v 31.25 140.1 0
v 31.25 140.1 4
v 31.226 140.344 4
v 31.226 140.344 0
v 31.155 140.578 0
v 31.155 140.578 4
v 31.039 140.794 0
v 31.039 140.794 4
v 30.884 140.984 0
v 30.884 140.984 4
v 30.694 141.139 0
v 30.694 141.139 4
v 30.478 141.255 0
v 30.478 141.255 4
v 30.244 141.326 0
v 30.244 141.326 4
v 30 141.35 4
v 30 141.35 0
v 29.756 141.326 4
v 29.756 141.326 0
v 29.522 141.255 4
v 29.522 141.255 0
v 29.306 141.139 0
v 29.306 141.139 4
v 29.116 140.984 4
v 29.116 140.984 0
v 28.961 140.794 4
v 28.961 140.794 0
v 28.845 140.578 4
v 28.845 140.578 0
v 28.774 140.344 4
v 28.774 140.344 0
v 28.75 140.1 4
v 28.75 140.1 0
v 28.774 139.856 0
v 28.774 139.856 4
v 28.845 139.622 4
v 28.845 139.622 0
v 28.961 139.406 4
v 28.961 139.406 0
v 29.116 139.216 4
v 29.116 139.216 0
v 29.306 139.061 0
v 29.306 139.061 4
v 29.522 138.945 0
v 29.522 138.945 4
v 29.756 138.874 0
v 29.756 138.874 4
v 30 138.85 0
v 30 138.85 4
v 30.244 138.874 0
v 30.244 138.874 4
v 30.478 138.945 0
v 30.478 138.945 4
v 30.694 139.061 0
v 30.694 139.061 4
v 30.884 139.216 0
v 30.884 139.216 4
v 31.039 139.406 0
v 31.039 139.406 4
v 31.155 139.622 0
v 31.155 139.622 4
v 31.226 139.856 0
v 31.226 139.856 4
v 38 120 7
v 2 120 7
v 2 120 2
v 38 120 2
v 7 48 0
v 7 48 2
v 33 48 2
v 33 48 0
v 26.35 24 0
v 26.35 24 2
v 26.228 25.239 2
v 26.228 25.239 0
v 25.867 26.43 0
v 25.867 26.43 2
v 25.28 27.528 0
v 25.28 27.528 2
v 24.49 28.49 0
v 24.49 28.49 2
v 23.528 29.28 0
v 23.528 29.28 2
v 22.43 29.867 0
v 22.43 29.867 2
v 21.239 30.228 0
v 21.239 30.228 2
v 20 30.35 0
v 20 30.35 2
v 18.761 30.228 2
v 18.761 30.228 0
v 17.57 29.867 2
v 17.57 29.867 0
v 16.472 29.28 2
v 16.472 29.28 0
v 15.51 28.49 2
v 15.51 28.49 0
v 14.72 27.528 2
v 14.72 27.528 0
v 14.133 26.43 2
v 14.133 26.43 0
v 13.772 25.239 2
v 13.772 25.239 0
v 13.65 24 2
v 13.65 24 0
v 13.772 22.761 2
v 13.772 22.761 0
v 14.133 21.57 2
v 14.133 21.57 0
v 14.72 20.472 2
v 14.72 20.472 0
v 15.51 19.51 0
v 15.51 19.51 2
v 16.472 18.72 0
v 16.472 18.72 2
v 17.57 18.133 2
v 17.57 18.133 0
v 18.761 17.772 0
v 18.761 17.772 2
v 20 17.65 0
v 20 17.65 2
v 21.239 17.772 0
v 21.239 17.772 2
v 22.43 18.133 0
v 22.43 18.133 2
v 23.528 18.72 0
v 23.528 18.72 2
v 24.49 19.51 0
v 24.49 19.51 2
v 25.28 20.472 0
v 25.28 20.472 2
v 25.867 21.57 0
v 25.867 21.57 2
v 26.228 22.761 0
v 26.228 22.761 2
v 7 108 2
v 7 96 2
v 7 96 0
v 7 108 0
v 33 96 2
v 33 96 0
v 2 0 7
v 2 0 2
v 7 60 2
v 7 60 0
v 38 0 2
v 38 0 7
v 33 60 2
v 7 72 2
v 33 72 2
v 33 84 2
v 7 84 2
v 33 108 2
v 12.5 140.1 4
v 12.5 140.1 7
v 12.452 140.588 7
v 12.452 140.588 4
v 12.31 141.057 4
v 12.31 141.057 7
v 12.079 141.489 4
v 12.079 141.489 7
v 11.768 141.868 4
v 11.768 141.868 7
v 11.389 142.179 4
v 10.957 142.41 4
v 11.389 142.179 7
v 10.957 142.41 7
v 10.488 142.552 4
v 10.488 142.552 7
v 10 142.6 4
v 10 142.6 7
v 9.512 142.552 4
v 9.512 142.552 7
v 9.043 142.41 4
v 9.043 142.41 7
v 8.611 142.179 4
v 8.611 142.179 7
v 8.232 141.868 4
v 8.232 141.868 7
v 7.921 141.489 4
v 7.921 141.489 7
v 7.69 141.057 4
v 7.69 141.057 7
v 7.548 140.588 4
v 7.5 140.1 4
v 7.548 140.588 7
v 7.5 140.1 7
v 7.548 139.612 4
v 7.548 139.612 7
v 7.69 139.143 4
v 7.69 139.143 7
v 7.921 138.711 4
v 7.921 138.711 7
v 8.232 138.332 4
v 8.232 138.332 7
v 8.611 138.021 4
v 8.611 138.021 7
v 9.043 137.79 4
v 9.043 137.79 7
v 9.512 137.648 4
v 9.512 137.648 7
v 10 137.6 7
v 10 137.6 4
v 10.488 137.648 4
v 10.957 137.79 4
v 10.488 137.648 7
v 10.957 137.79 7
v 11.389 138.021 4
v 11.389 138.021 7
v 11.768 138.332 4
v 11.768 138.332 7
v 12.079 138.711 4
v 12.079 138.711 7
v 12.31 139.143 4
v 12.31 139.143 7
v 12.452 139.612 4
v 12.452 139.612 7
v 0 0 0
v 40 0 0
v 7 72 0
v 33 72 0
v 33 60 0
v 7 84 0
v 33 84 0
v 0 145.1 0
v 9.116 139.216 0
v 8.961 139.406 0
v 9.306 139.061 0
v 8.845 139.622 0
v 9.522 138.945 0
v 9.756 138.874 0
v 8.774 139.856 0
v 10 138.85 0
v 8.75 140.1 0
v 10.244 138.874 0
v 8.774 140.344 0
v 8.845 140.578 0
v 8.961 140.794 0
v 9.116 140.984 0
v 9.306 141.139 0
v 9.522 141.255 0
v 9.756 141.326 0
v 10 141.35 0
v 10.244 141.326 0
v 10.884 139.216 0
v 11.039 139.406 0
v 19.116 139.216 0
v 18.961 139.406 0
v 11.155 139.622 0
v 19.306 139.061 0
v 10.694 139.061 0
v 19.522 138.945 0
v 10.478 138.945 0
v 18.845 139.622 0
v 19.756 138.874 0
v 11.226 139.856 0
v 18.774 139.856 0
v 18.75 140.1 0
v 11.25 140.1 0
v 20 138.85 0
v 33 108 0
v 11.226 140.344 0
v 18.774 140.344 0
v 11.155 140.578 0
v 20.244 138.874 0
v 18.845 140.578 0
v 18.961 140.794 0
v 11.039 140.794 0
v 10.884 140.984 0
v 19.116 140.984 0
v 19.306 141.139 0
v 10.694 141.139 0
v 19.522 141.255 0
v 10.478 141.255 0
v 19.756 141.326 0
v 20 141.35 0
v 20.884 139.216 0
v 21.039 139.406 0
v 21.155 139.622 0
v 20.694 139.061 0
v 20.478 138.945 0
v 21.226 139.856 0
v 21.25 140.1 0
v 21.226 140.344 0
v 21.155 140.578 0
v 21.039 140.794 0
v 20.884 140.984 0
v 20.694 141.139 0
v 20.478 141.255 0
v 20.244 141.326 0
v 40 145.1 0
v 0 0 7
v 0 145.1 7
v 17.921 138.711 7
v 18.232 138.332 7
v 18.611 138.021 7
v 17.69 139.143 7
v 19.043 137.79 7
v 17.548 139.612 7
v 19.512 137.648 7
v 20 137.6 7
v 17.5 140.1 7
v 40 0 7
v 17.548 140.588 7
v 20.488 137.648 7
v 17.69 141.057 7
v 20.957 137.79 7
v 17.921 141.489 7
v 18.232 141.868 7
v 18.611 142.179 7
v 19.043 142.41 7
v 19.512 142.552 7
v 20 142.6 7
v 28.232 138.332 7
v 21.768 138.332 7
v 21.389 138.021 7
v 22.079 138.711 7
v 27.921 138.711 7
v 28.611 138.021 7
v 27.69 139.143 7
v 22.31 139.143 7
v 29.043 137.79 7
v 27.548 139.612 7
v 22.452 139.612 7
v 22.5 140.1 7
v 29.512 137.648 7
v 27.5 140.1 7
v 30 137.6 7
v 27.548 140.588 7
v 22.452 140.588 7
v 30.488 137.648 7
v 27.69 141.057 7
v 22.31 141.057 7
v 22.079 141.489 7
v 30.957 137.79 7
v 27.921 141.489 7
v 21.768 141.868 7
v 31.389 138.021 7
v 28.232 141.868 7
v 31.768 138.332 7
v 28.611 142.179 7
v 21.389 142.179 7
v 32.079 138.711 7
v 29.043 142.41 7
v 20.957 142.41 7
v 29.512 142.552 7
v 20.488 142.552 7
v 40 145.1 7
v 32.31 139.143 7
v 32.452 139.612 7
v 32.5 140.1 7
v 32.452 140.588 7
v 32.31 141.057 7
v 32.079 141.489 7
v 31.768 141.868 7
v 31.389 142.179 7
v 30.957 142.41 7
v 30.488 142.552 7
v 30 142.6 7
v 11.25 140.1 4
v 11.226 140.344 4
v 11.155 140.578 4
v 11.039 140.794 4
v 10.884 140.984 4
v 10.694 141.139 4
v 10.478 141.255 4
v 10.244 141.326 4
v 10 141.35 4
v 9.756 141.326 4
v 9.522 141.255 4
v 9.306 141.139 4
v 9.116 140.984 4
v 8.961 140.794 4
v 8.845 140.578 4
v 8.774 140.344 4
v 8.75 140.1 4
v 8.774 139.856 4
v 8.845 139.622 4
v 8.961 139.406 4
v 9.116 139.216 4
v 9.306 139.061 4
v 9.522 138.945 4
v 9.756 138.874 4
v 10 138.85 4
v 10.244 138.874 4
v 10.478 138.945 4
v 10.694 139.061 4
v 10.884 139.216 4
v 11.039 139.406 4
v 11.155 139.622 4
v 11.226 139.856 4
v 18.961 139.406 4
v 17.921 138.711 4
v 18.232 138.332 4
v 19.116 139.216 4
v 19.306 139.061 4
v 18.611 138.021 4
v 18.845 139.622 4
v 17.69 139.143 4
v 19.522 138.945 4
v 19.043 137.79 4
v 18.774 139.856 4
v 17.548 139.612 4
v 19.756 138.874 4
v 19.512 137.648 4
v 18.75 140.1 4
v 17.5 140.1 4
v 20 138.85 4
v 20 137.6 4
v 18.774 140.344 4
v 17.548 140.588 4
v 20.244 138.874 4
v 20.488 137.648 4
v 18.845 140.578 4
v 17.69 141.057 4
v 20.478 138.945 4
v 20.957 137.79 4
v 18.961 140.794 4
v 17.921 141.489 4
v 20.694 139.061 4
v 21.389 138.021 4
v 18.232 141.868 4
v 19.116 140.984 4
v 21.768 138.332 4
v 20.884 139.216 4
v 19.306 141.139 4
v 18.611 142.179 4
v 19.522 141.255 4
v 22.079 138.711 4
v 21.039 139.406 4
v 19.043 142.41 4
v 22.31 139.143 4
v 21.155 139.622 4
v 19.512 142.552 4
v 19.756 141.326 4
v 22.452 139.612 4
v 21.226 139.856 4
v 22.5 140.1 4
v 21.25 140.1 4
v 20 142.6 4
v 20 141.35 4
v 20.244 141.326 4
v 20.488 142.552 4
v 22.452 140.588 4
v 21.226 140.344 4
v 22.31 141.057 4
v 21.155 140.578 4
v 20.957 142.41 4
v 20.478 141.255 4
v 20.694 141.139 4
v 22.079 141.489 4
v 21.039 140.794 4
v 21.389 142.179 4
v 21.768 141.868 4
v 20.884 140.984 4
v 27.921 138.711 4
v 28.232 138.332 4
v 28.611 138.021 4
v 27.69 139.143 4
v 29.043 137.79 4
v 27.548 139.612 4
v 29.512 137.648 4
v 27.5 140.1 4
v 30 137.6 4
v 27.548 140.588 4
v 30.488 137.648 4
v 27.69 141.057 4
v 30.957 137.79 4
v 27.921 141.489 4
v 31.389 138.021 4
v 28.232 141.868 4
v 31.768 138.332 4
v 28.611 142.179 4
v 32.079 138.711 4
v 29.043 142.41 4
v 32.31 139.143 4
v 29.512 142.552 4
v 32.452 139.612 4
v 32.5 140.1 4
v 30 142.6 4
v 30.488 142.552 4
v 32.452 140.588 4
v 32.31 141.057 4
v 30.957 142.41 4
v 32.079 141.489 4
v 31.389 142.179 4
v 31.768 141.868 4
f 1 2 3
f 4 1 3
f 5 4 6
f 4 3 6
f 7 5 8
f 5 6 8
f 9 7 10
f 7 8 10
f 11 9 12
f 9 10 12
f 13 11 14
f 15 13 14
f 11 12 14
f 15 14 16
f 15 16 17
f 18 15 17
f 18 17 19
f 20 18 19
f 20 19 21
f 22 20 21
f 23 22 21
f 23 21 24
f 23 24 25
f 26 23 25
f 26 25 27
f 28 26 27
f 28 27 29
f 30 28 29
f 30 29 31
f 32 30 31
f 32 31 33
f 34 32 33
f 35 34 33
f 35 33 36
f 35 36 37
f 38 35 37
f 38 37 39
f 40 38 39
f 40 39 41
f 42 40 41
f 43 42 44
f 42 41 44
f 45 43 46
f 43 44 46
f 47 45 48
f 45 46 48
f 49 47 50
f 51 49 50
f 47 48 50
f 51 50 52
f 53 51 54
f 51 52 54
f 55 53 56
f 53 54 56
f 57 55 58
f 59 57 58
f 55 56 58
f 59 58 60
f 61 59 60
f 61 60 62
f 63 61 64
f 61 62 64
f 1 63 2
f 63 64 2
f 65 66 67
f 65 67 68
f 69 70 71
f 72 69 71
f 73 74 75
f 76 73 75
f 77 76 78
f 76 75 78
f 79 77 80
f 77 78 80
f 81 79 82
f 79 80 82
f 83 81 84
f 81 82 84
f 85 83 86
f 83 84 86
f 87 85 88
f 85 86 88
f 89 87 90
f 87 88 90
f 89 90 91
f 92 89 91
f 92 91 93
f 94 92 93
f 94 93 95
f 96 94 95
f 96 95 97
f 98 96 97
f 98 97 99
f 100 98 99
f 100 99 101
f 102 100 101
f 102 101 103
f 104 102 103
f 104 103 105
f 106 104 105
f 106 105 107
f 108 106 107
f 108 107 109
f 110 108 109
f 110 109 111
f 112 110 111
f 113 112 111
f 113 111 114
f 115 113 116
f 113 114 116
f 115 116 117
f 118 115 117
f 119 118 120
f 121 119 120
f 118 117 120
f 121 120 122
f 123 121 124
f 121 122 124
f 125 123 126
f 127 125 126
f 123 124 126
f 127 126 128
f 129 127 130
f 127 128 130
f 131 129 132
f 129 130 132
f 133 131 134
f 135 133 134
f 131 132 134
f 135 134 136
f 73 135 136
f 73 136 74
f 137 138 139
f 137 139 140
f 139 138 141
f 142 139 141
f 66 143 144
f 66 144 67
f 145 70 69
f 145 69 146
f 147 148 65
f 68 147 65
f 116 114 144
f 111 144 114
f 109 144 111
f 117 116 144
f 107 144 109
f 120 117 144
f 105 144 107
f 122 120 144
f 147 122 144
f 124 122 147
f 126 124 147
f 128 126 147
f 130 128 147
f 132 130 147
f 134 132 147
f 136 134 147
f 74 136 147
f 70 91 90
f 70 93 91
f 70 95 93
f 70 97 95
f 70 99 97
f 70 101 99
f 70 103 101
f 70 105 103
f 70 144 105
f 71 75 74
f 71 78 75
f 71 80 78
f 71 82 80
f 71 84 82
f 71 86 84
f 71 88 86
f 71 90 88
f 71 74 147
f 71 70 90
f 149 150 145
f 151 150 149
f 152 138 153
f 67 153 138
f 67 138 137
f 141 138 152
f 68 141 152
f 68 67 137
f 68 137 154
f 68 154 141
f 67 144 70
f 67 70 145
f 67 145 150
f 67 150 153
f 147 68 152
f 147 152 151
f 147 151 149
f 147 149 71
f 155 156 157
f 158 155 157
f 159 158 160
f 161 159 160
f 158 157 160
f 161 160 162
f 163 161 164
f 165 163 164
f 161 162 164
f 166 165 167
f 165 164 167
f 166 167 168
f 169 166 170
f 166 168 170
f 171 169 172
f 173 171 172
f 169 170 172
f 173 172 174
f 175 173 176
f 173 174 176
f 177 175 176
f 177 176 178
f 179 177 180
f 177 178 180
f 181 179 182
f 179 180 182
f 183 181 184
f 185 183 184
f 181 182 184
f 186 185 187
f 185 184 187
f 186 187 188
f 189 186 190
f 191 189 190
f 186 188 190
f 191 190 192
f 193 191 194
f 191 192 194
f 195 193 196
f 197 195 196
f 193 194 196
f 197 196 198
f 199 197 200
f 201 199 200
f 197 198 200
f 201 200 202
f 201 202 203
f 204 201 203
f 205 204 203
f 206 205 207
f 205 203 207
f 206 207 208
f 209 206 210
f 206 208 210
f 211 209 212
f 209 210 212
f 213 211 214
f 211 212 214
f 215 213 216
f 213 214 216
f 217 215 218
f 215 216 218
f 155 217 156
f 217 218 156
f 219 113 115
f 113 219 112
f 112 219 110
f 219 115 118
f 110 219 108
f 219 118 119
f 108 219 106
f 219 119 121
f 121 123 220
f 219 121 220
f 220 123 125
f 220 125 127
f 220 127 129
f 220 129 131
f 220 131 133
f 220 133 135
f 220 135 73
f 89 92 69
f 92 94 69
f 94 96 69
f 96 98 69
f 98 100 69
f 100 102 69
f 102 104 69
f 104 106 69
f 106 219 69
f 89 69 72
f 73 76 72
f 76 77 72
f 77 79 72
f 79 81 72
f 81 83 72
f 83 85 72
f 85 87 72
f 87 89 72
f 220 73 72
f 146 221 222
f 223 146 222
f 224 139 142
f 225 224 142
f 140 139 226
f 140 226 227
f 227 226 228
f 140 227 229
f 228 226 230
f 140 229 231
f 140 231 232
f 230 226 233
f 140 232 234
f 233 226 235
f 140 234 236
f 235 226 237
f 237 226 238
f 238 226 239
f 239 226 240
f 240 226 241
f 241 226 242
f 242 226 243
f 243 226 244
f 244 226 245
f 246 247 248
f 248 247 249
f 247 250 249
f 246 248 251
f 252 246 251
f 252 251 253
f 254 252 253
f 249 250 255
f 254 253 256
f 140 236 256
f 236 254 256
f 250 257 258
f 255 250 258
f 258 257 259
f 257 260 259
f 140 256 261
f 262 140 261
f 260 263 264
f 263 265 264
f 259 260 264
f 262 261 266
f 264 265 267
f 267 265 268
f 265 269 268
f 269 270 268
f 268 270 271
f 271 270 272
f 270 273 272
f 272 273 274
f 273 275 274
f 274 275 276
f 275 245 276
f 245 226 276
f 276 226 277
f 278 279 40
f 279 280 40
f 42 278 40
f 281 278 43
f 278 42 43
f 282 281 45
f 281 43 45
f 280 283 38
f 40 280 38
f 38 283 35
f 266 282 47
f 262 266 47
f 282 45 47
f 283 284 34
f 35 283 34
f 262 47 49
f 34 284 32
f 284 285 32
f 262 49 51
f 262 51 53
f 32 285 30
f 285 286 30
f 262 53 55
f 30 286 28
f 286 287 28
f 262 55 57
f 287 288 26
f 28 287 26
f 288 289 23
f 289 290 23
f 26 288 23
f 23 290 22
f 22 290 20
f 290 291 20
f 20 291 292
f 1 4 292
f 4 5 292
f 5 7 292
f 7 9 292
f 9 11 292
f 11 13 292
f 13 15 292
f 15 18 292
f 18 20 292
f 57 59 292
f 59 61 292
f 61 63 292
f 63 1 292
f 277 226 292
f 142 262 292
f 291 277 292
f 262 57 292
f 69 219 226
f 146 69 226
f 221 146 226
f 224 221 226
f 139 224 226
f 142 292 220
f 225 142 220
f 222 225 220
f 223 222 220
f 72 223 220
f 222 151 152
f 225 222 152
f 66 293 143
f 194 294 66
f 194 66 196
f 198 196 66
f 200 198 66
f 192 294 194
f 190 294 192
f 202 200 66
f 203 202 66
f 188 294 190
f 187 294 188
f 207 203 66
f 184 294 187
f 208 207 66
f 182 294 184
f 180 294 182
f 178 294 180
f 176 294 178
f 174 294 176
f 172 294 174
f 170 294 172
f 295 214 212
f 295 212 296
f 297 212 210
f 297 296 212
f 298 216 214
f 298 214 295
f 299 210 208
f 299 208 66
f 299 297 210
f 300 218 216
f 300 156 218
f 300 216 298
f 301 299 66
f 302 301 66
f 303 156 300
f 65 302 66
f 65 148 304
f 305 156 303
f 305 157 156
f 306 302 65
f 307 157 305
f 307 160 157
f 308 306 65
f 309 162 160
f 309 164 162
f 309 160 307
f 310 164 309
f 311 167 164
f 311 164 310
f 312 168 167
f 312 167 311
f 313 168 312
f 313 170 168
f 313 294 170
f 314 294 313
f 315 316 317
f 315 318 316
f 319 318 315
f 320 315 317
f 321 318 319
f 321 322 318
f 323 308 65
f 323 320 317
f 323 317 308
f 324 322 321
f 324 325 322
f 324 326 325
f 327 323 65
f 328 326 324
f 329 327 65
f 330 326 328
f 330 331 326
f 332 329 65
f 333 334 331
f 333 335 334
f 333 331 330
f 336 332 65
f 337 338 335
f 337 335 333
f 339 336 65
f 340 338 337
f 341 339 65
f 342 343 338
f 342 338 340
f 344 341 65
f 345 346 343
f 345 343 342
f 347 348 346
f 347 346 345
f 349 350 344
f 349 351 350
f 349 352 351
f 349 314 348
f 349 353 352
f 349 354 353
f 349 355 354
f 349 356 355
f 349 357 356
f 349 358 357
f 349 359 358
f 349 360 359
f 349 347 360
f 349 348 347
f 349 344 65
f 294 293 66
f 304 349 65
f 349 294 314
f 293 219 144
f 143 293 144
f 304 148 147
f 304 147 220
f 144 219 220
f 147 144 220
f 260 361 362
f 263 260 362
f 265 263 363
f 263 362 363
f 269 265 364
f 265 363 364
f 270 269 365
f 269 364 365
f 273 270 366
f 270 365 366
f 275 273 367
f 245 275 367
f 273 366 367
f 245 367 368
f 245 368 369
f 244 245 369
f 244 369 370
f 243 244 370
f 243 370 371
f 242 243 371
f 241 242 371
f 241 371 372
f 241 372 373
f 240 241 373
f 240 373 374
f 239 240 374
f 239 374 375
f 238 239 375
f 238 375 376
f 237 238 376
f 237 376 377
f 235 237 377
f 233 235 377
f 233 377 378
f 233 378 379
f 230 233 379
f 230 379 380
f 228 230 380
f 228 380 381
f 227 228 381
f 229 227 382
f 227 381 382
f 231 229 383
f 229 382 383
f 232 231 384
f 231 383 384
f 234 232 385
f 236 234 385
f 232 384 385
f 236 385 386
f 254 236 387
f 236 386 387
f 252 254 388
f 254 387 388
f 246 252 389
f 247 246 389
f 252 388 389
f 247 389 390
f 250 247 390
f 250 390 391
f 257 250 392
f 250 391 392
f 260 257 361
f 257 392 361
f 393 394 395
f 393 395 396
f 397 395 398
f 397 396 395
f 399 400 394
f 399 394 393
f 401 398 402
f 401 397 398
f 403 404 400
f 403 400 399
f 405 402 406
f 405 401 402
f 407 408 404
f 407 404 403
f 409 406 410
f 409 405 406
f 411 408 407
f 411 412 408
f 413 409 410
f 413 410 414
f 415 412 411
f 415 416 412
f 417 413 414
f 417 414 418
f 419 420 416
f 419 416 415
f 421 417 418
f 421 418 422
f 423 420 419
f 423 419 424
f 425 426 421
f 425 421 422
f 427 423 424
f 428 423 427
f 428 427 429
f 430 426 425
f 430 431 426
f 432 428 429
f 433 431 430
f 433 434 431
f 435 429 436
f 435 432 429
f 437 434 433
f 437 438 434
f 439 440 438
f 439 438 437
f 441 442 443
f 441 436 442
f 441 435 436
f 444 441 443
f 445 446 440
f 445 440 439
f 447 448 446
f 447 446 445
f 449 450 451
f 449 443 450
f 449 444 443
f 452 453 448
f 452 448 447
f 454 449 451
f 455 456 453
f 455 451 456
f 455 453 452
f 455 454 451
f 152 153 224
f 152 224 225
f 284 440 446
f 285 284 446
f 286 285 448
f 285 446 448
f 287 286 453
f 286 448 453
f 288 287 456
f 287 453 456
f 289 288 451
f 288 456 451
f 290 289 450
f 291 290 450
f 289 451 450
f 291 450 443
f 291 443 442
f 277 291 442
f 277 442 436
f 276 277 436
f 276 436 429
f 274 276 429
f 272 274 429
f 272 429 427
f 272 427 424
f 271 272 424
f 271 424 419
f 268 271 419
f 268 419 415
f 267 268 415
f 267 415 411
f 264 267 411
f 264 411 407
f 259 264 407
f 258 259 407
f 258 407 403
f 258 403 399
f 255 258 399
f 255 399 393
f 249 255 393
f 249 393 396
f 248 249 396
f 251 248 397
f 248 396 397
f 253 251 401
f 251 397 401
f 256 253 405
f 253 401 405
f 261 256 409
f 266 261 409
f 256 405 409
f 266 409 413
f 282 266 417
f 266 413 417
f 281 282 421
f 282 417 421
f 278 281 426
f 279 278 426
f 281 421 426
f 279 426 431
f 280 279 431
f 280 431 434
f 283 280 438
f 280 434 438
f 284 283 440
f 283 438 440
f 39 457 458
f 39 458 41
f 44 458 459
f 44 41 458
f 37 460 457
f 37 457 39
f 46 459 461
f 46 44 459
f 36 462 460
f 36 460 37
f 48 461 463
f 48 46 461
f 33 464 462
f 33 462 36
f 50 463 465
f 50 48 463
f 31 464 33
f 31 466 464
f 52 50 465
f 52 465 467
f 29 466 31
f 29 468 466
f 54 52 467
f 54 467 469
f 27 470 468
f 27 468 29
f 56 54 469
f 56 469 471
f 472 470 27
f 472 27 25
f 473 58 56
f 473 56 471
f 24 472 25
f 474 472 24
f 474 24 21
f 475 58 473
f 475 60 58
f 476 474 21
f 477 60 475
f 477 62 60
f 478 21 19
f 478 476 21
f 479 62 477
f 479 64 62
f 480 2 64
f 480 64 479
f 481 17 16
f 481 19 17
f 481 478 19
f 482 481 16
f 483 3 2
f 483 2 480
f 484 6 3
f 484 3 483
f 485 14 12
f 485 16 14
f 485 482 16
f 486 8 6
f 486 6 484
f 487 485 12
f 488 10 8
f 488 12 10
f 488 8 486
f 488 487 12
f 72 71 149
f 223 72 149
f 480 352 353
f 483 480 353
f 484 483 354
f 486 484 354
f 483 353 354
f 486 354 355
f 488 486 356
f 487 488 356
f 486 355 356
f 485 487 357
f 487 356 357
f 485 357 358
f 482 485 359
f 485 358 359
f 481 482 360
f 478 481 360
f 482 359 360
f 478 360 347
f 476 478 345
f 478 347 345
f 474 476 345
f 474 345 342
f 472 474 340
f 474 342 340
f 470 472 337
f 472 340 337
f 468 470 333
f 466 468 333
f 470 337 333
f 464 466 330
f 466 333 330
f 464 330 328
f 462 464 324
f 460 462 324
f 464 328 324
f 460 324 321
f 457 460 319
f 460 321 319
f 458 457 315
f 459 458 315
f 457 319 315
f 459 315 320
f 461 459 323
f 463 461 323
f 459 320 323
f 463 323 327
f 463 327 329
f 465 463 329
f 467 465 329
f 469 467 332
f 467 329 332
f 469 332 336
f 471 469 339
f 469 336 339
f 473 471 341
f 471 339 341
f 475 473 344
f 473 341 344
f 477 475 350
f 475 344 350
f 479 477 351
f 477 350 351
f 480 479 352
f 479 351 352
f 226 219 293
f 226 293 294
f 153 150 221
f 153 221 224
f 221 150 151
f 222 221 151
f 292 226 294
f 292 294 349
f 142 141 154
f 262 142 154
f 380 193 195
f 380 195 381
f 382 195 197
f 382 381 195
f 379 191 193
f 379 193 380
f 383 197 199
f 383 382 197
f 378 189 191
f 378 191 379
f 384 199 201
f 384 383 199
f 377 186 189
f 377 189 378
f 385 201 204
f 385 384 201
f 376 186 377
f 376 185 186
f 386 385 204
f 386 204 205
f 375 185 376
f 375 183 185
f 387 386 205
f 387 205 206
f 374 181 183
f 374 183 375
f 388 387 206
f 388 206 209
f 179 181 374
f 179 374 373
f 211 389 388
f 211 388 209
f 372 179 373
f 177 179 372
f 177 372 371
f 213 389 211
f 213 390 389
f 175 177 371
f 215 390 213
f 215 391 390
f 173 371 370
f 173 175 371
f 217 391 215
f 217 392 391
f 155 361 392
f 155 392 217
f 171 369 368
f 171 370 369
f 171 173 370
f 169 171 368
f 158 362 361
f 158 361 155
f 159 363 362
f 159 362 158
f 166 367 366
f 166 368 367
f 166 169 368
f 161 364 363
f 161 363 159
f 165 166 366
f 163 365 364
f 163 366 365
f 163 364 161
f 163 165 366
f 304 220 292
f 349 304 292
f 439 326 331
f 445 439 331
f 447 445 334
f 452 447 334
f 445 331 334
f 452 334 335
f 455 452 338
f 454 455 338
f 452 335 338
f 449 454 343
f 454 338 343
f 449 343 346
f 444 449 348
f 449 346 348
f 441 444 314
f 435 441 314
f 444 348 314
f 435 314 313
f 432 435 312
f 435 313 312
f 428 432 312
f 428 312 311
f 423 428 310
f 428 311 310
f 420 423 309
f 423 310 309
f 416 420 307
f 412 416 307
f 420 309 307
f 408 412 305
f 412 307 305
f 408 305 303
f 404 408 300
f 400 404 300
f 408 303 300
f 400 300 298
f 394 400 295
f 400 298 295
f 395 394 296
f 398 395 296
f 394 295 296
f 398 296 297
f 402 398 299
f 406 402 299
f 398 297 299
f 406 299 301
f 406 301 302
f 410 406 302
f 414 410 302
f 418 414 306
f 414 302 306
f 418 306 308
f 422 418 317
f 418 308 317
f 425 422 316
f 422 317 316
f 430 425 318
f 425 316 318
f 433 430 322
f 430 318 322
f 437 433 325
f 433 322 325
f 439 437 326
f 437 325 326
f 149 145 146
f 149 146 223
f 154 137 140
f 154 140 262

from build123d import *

# Parameters (mm, degrees)
SKETCH1_W           = 40
SKETCH1_H           = 145.1
BOSS_EXTRUDE1_DEPTH = 7
SKETCH2_R           = 1.25
CUT_EXTRUDE1_DEPTH  = 7
SKETCH3_R           = 2.5
CUT_EXTRUDE2_DEPTH  = 3
SKETCH4_R           = 6.35
CUT_EXTRUDE3_DEPTH  = 8
SKETCH5_W           = 36
SKETCH5_H           = 120
CUT_EXTRUDE4_DEPTH  = 5
SKETCH6_W           = 26
SKETCH6_H           = 12
CUT_EXTRUDE5_DEPTH  = 3


with BuildPart() as part:
    # Sketch1 → Boss-Extrude1 (new body)
    with BuildSketch(Plane.XY):
        with Locations((20, 72.55)):
            Rectangle(SKETCH1_W, SKETCH1_H)
    extrude(amount=BOSS_EXTRUDE1_DEPTH)

    # Sketch2 → Cut-Extrude1 (cut)
    with BuildSketch(Plane.XY.offset(7)):
        with Locations((20, 140.1)):
            Circle(SKETCH2_R)
        with Locations((10, 140.1)):
            Circle(SKETCH2_R)
        with Locations((30, 140.1)):
            Circle(SKETCH2_R)
    extrude(amount=-CUT_EXTRUDE1_DEPTH, mode=Mode.SUBTRACT)

    # Sketch3 → Cut-Extrude2 (cut)
    with BuildSketch(Plane.XY.offset(7)):
        with Locations((10, 140.1)):
            Circle(SKETCH3_R)
        with Locations((20, 140.1)):
            Circle(SKETCH3_R)
        with Locations((30, 140.1)):
            Circle(SKETCH3_R)
    extrude(amount=-CUT_EXTRUDE2_DEPTH, mode=Mode.SUBTRACT)

    # Sketch4 → Cut-Extrude3 (cut, through all)
    with BuildSketch(Plane.XY.offset(7)):
        with Locations((20, 24)):
            Circle(SKETCH4_R)
    extrude(amount=-CUT_EXTRUDE3_DEPTH, mode=Mode.SUBTRACT)

    # Sketch5 → Cut-Extrude4 (cut)
    with BuildSketch(Plane.XY.offset(7)):
        with Locations((20, 60)):
            Rectangle(SKETCH5_W, SKETCH5_H)
    extrude(amount=-CUT_EXTRUDE4_DEPTH, mode=Mode.SUBTRACT)

    # Sketch6 → Cut-Extrude5 (cut, through all)
    with BuildSketch(Plane.XY.offset(2)):
        with Locations((20, 102)):
            Rectangle(SKETCH6_W, SKETCH6_H)
        with Locations((20, 78)):
            Rectangle(SKETCH6_W, SKETCH6_H)
        with Locations((20, 54)):
            Rectangle(SKETCH6_W, SKETCH6_H)
    extrude(amount=-CUT_EXTRUDE5_DEPTH, mode=Mode.SUBTRACT)


solid = part.part
